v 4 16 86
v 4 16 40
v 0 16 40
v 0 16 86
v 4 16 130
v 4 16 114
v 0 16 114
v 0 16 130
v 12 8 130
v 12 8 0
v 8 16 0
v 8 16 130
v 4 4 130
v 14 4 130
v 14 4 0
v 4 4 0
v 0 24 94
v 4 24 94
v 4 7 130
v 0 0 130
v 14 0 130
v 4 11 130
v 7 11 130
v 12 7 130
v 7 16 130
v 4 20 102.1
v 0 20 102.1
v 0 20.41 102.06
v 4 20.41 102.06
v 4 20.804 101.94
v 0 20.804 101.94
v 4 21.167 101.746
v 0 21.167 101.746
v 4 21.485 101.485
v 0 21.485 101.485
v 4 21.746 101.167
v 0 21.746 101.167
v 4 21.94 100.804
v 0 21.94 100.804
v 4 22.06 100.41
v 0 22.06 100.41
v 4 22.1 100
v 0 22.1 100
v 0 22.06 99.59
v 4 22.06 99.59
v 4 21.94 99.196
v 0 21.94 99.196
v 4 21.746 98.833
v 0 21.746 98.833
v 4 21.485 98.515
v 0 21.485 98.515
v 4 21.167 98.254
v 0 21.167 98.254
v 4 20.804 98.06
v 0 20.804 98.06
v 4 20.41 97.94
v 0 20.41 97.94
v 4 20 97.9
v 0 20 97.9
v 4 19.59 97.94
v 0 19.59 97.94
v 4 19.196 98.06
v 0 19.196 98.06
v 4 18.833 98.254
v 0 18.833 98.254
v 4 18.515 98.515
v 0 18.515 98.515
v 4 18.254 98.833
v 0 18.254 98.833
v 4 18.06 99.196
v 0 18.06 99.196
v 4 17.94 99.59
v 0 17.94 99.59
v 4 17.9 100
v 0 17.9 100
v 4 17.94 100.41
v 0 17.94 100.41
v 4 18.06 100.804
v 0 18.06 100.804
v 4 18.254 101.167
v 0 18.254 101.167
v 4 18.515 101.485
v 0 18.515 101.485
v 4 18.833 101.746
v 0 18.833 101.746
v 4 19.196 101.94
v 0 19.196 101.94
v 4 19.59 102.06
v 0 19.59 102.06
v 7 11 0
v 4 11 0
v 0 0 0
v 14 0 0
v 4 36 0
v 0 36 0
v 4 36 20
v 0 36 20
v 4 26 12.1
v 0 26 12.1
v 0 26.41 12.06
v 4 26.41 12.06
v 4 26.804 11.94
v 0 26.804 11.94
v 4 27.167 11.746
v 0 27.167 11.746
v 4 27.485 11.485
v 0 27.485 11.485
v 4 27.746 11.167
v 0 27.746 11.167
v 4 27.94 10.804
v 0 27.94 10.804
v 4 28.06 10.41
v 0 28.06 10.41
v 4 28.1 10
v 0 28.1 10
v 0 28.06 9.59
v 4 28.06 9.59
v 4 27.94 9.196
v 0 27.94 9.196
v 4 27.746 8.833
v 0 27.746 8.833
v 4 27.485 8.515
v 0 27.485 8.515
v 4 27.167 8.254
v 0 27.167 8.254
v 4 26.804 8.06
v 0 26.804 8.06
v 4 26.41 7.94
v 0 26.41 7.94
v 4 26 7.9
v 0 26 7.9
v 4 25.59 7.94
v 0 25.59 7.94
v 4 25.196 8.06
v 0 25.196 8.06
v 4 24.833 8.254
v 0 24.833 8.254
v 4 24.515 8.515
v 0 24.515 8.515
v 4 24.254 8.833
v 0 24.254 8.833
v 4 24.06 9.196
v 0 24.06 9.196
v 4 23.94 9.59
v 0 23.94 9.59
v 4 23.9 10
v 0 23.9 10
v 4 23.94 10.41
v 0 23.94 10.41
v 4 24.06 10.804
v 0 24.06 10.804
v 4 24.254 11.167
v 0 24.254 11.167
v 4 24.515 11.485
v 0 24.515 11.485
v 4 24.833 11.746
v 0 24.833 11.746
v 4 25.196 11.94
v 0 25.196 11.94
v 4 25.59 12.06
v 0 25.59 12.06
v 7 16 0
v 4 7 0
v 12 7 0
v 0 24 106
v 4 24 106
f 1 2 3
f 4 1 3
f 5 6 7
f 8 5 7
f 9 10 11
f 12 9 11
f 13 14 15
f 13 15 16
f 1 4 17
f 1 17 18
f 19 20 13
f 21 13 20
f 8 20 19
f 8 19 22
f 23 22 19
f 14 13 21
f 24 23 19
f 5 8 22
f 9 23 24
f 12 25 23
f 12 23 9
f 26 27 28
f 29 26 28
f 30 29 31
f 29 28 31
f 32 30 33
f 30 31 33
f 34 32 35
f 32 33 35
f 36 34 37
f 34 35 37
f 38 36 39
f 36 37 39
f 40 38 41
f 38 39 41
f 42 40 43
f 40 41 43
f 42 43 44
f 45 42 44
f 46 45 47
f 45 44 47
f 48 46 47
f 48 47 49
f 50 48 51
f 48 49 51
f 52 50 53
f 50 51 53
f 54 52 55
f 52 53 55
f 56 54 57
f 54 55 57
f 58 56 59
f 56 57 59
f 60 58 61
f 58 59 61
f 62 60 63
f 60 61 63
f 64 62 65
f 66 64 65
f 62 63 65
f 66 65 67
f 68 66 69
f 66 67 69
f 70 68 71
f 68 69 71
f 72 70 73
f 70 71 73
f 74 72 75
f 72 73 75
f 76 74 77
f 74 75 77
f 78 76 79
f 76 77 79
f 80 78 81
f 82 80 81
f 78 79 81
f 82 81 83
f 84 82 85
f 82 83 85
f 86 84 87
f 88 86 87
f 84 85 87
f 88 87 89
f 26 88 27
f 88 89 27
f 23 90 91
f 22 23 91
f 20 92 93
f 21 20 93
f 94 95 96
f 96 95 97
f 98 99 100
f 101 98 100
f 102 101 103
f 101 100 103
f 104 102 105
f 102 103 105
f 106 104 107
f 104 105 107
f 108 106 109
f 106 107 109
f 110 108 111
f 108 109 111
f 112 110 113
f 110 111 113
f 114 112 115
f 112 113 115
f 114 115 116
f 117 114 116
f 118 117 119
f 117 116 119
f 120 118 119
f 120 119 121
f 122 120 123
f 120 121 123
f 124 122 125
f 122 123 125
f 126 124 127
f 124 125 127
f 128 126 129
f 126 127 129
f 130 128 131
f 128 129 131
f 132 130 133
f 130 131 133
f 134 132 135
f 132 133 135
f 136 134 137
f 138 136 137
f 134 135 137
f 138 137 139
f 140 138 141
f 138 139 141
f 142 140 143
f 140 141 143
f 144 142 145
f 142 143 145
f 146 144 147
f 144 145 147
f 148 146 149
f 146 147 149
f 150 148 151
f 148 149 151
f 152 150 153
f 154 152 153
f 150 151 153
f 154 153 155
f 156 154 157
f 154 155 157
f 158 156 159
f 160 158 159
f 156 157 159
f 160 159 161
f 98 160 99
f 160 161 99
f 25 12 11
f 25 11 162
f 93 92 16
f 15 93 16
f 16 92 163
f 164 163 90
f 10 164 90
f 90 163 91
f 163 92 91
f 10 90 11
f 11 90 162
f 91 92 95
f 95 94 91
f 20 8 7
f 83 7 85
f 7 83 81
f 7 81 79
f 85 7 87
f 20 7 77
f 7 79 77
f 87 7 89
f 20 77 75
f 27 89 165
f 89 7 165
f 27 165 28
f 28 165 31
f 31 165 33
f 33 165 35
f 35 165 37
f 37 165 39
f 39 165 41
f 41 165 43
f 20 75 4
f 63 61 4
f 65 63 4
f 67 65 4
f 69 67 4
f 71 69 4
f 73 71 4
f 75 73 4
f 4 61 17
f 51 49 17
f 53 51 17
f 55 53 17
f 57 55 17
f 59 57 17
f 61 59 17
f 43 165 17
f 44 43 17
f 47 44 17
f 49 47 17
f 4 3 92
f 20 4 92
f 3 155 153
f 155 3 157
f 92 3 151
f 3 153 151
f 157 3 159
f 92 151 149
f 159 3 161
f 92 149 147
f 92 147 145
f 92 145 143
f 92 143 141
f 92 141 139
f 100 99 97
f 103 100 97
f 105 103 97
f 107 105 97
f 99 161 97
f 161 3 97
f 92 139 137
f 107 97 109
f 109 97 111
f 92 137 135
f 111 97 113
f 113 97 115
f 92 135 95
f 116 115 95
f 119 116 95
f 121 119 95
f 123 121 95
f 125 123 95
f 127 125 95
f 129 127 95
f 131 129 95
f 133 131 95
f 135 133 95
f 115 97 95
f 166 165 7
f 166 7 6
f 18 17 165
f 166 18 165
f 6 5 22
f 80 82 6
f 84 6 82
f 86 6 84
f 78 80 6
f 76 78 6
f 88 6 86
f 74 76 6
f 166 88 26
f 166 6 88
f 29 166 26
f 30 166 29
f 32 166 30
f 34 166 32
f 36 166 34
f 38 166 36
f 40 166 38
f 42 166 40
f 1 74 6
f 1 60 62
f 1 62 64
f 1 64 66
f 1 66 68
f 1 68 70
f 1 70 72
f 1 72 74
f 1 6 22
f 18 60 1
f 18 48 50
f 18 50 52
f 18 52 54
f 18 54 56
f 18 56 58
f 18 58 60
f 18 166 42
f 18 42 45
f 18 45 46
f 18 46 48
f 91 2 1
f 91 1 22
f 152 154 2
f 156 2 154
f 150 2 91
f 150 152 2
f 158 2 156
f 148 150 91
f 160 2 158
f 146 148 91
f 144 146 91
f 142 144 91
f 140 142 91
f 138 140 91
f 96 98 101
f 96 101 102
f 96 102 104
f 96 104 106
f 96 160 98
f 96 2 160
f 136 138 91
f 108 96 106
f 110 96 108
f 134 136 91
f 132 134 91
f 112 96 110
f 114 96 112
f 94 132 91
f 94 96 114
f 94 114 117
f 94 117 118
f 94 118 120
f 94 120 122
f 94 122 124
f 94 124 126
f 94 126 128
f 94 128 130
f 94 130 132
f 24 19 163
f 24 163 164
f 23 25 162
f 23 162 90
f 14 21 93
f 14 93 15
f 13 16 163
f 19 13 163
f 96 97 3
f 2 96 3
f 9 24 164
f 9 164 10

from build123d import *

# Parameters (mm, degrees)
DODANIE_WYCI_GNI_CIE1_DEPTH = 130
SZKIC2_R                    = 2.1
SZKIC2_W                    = 12
SZKIC2_H                    = 8
DODANIE_WYCI_GNI_CIE2_DEPTH = 4
SFAZOWANIE1_SIZE            = 8


with BuildPart() as part:
    # Szkic1 → Dodanie-wyciągnięcie1 (new body)
    with BuildSketch(Plane.XY):
        Polygon((0, 0), (14, 0), (14, 4), (4, 4), (4, 7), (12, 7), (12, 8), (8, 16), (7, 16), (7, 11), (4, 11), (4, 16), (0, 16), align=None)
    extrude(amount=DODANIE_WYCI_GNI_CIE1_DEPTH)

    # Szkic2 → Dodanie-wyciągnięcie2 (add)
    # profile 1 of 2: a face of its own
    with BuildSketch(Plane.ZY):
        Polygon((20, 36), (40, 16), (20, 16), (0, 16), (0, 36), align=None)
        with Locations((10, 26)):
            Circle(SZKIC2_R, mode=Mode.SUBTRACT)
    # profile 2 of 2: a face of its own
    with BuildSketch(Plane.ZY):
        with Locations((100, 20)):
            Rectangle(SZKIC2_W, SZKIC2_H)
        with Locations((100, 20)):
            Circle(SZKIC2_R, mode=Mode.SUBTRACT)
    extrude(amount=-DODANIE_WYCI_GNI_CIE2_DEPTH)

    # Sfazowanie1
    sfazowanie1_edges = [part.edges().sort_by_distance(p)[0] for p in [
        (2, 16, 94),
        (2, 16, 106),
    ]]
    chamfer(sfazowanie1_edges, length=SFAZOWANIE1_SIZE - 0.0001)  # a hair under: the kernel refuses the full size


solid = part.part
